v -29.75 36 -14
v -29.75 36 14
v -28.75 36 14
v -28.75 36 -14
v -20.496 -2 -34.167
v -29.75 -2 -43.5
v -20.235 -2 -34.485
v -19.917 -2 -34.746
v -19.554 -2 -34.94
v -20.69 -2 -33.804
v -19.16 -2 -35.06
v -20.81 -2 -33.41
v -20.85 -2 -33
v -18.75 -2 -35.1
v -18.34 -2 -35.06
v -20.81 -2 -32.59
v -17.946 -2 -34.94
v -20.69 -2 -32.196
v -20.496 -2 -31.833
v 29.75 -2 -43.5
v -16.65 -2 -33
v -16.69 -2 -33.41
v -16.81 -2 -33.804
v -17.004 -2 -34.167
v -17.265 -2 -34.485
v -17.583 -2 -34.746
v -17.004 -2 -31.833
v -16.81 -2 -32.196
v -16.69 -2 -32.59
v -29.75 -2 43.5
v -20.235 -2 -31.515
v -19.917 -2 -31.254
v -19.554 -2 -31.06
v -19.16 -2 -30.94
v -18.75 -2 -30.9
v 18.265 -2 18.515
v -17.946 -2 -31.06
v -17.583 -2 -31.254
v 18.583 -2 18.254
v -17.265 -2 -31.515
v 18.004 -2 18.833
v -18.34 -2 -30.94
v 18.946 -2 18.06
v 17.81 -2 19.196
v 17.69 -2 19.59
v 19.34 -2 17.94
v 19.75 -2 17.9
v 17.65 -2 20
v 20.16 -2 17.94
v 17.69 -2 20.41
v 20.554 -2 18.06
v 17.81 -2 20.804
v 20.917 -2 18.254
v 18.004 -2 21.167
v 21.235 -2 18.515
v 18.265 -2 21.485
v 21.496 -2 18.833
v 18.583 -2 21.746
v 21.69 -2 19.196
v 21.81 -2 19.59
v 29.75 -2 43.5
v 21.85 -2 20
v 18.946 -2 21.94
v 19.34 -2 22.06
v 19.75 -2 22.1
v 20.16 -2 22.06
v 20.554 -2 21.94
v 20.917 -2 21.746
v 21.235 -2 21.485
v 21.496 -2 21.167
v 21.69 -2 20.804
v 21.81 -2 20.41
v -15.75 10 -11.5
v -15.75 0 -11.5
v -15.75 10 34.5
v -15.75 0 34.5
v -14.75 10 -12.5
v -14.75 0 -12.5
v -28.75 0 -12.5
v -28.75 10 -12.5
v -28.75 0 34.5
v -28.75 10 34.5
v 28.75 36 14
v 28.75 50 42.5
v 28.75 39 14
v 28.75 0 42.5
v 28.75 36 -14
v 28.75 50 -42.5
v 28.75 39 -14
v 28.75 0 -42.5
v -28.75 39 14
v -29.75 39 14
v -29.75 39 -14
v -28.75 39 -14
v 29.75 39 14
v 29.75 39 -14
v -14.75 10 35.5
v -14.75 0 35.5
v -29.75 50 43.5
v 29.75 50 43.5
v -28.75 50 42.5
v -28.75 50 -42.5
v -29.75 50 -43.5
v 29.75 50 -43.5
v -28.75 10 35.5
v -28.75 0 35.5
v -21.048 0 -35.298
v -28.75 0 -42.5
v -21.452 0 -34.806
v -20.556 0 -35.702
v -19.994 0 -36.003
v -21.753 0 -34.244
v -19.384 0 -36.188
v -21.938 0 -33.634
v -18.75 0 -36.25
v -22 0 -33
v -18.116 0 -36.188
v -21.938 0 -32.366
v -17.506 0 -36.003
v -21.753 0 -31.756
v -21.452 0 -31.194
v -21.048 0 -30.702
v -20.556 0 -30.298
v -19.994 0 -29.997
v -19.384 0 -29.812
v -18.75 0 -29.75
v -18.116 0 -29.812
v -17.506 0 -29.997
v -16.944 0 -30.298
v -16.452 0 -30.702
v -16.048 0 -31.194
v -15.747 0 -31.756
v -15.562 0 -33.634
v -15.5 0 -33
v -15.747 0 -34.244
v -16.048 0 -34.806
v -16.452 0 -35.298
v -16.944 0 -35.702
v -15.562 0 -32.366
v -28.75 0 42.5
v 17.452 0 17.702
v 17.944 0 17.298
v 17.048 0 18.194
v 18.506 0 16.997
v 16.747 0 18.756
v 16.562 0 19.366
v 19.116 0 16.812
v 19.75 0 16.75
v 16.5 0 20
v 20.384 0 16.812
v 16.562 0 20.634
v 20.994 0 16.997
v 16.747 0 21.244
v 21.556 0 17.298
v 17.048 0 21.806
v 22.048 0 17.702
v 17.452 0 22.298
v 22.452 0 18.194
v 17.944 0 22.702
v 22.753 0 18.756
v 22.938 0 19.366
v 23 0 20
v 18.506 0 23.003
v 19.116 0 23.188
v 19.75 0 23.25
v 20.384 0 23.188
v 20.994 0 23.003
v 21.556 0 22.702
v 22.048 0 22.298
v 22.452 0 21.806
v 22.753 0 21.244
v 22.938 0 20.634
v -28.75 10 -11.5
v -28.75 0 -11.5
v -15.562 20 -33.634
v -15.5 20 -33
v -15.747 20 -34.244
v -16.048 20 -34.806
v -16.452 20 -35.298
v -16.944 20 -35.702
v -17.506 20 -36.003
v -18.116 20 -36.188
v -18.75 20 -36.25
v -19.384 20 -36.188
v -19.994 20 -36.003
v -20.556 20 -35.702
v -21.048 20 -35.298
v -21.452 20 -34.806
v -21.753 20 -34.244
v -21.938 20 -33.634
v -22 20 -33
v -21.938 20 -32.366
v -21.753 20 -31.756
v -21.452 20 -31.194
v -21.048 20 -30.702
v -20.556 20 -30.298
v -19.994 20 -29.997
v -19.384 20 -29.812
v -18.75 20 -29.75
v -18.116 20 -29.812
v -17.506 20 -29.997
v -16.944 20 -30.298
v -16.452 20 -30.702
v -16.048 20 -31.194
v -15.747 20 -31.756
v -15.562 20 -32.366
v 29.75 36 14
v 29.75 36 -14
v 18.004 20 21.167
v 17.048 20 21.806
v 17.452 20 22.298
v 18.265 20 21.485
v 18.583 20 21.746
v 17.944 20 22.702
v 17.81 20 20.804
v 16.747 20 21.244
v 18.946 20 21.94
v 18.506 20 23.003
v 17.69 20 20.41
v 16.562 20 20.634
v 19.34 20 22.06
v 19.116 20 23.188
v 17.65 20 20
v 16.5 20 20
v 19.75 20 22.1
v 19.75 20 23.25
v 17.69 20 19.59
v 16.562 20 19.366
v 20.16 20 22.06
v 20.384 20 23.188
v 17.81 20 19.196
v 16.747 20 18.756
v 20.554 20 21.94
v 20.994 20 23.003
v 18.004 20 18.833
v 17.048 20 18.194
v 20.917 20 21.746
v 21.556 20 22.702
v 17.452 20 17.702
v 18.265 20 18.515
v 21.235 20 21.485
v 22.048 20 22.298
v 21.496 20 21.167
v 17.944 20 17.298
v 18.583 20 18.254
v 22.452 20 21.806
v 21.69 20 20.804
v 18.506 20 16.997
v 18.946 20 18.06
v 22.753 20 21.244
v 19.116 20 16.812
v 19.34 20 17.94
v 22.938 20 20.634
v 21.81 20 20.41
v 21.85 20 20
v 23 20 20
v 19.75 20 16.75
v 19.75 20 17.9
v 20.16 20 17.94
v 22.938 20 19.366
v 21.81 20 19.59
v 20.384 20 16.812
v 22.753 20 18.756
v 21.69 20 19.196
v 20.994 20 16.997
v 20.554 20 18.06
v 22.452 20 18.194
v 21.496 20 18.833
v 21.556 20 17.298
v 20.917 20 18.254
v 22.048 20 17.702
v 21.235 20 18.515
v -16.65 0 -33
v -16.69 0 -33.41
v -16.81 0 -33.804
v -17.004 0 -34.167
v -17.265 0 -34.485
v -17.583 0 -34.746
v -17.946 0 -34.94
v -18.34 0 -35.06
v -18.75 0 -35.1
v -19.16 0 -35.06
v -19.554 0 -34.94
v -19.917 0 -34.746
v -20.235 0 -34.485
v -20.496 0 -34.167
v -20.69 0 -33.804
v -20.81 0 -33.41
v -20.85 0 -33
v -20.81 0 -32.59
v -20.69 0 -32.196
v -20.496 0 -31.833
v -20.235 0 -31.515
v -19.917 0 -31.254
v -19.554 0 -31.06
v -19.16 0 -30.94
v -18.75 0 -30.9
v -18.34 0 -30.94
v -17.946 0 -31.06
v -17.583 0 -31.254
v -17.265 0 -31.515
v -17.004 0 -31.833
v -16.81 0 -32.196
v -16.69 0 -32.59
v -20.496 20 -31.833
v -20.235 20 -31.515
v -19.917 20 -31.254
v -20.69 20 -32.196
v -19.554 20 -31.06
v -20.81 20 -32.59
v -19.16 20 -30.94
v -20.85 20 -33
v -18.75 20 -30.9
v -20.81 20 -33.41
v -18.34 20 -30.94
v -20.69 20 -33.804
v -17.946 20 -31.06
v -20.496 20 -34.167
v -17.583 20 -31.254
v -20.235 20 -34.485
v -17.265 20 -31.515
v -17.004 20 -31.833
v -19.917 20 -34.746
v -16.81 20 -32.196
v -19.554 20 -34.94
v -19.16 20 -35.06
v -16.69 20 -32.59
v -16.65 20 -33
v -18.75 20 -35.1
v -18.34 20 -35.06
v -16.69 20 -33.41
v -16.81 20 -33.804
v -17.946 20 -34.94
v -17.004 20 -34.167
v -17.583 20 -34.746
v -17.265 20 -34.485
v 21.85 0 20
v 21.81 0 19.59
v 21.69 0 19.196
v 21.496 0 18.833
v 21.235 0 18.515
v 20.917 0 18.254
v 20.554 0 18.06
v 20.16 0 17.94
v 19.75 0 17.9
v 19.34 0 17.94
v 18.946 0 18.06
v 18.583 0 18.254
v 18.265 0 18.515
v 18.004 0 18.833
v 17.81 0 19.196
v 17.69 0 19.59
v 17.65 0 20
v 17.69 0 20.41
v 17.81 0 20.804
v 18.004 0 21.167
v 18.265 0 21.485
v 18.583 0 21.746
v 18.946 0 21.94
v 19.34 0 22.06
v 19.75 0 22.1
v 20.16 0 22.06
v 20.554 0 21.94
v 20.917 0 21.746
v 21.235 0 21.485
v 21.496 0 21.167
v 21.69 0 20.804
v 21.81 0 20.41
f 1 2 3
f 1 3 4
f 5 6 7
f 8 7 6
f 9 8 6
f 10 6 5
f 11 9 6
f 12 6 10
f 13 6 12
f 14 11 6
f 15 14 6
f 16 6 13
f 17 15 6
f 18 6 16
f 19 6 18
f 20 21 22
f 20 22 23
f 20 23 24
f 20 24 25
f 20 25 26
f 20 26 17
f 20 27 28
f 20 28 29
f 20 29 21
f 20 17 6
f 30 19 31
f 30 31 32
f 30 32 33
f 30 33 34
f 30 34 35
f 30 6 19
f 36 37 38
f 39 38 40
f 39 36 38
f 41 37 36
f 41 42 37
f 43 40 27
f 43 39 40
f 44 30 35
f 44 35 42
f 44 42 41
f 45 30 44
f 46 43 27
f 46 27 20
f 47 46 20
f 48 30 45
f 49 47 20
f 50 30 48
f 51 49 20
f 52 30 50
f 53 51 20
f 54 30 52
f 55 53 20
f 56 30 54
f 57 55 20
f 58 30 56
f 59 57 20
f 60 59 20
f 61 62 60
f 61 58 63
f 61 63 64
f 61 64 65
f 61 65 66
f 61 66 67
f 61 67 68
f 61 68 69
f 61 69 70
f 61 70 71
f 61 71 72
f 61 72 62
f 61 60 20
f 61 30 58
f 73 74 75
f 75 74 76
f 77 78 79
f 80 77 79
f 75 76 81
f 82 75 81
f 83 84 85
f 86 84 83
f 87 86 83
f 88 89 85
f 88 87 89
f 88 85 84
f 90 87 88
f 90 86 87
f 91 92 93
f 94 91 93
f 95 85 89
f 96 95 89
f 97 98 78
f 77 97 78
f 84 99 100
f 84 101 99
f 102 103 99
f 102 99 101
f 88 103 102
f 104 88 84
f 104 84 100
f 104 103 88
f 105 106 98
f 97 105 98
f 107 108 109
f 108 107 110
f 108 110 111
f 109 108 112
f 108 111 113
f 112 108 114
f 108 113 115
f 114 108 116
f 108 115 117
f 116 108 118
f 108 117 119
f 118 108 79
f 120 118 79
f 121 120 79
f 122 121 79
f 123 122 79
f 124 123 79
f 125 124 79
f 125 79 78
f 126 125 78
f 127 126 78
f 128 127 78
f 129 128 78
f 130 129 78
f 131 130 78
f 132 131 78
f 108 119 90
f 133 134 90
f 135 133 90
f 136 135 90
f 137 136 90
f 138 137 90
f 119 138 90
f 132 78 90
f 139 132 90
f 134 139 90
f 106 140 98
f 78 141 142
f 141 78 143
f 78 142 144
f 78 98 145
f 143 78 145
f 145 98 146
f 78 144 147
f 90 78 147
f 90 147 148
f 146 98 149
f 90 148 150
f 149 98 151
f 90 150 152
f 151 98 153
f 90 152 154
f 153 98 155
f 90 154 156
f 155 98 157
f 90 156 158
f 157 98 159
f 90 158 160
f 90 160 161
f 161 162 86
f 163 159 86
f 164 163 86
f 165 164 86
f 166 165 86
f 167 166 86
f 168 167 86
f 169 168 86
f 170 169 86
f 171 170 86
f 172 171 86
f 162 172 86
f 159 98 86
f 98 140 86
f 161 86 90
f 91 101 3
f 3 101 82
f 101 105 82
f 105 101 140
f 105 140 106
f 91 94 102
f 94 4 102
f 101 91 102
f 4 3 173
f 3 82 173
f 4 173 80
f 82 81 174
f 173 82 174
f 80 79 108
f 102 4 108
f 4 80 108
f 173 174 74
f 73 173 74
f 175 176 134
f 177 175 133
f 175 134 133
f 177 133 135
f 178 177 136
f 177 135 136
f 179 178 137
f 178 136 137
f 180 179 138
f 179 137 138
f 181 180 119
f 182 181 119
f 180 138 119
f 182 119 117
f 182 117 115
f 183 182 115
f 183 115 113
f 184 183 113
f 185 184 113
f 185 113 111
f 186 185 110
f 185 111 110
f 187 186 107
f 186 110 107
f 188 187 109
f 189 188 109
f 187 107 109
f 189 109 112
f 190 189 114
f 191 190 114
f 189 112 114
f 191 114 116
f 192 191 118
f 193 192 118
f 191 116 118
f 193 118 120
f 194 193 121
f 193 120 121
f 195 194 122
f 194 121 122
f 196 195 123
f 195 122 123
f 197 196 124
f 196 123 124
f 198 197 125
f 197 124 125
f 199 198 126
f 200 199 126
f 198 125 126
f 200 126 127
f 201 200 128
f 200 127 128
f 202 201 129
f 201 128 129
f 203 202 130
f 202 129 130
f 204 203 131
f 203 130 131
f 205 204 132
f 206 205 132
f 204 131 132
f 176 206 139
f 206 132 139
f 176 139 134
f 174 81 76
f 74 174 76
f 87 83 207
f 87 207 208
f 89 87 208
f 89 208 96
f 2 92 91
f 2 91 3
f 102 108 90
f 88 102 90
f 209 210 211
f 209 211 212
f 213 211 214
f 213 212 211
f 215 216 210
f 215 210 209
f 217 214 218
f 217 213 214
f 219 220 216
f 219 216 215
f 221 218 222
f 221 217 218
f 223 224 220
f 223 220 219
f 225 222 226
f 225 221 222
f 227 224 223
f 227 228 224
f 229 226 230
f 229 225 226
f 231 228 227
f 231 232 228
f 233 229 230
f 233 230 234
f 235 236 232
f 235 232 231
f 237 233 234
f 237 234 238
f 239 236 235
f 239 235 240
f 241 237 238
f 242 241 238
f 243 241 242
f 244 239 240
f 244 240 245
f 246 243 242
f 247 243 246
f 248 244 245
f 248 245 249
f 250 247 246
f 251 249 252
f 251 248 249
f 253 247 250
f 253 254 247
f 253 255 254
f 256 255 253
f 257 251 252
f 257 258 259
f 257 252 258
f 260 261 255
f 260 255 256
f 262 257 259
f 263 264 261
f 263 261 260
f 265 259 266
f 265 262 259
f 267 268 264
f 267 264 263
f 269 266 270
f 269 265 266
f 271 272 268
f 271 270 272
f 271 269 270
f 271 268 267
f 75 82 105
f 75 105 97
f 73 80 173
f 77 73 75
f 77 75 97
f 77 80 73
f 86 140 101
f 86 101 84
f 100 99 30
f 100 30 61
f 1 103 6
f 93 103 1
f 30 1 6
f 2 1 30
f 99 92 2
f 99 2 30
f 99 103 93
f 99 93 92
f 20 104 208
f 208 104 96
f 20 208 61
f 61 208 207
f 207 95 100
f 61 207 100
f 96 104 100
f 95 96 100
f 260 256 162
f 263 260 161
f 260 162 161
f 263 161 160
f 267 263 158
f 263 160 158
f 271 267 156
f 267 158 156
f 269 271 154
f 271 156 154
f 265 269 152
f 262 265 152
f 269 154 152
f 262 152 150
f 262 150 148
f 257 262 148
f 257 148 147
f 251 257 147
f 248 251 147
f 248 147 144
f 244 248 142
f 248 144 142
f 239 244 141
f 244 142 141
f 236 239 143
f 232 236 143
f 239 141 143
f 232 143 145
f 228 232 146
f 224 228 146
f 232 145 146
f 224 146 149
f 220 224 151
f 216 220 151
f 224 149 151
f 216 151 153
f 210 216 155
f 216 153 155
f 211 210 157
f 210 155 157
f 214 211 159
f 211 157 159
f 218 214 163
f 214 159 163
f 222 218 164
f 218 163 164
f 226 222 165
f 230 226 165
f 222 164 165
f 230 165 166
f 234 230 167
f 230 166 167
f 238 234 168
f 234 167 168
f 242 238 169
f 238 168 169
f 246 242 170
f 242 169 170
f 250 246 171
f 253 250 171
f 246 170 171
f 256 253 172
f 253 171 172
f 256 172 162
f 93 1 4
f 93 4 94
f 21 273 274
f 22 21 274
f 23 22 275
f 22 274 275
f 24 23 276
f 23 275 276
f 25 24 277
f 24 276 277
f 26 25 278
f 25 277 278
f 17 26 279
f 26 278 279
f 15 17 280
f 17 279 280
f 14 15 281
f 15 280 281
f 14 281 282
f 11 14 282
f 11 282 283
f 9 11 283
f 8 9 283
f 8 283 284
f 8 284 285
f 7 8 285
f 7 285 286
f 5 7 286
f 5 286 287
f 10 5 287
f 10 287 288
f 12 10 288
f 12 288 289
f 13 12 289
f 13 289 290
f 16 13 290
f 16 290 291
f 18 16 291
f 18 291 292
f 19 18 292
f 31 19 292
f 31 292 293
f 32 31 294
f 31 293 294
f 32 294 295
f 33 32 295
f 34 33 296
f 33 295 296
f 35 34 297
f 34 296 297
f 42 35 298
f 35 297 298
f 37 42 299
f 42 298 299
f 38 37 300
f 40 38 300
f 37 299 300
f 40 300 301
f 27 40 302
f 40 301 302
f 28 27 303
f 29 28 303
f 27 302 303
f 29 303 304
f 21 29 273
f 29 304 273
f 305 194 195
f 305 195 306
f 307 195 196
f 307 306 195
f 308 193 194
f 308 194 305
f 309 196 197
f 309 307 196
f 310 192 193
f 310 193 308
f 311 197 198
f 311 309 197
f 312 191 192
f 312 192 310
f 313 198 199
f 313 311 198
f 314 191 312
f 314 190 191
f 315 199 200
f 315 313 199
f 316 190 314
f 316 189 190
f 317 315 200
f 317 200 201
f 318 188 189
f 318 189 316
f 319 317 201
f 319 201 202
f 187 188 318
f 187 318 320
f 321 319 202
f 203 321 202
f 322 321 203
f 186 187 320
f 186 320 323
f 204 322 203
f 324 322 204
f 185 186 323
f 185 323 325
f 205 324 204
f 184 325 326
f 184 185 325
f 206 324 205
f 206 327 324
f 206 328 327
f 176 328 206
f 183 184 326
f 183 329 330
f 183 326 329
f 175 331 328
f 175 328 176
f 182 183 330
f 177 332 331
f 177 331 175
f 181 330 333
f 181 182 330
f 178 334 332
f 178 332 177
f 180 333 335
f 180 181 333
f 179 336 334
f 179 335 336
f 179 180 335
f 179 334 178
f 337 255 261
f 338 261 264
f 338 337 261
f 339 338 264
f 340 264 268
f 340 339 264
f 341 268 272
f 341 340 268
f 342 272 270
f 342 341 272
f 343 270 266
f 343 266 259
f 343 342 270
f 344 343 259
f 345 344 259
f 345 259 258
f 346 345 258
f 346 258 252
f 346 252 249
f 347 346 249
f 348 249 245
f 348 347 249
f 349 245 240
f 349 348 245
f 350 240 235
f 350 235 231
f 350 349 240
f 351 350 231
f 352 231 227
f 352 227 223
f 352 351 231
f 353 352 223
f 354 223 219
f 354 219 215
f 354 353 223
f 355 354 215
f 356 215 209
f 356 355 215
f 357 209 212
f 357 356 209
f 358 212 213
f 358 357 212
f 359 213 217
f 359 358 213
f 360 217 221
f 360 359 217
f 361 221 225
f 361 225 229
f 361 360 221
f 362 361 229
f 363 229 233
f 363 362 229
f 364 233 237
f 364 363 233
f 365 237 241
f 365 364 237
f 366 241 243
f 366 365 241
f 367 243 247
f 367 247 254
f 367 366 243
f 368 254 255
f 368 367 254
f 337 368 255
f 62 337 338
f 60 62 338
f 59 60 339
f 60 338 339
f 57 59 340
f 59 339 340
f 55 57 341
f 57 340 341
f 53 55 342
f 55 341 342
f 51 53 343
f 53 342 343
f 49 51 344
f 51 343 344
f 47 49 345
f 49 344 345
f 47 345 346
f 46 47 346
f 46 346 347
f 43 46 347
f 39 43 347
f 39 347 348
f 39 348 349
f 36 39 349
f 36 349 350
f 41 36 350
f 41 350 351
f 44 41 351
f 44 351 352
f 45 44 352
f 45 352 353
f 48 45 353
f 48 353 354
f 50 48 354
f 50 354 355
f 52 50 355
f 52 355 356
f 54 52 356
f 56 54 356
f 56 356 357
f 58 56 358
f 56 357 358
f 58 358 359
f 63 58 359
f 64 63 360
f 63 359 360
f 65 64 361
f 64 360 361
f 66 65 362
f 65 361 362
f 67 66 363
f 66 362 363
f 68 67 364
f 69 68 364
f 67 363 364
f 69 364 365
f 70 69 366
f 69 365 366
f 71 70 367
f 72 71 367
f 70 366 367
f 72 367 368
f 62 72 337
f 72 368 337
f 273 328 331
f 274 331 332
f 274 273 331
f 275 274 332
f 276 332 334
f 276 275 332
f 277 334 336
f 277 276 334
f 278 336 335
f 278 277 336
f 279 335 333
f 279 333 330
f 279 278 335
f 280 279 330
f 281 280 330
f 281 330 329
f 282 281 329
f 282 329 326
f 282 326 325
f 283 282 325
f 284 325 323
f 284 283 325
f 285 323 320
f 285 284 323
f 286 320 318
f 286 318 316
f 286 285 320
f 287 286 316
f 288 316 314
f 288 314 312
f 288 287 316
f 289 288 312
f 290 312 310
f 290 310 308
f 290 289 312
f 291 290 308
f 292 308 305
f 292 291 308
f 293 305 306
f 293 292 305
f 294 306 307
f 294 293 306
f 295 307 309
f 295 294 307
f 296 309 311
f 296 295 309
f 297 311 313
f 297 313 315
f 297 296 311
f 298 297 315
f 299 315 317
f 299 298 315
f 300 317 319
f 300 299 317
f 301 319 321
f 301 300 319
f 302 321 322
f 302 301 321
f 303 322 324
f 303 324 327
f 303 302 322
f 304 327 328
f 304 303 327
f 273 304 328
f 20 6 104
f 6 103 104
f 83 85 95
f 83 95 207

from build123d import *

# Parameters (mm, degrees)
CROQUIS1_W                = 59.5
CROQUIS1_H                = 87
SALIENTE_EXTRUIR1_DEPTH   = 50
SALIENTE_EXTRUIR2_DEPTH   = 10
CROQUIS1_5_R              = 3.25
CROQUIS1_5_R_2            = 2.1
SALIENTE_EXTRUIR3_DEPTH   = 20
SALIENTE_EXTRUIR3_2_DEPTH = 20
CROQUIS2_W                = 59.5
CROQUIS2_H                = 87
SALIENTE_EXTRUIR6_DEPTH   = 2
CORTAR_EXTRUIR3_START     = -10
CROQUIS9_R                = 2.1
CORTAR_EXTRUIR3_DEPTH     = 10
CORTAR_EXTRUIR4_DEPTH     = 100


with BuildPart() as part:
    # Croquis1 → Saliente-Extruir1 (new body)
    with BuildSketch(Plane(origin=(0, 0, 0), x_dir=(1, 0, 0), z_dir=(0, 1, 0))):
        Rectangle(CROQUIS1_W, CROQUIS1_H)
        Polygon((28.75, -42.5), (-28.75, -42.5), (-28.75, -35.5), (-28.75, -34.5), (-28.75, 11.5), (-28.75, 12.5), (-28.75, 42.5), (28.75, 42.5), align=None, mode=Mode.SUBTRACT)
    extrude(amount=SALIENTE_EXTRUIR1_DEPTH)

    # Croquis1<4> → Saliente-Extruir2 (add)
    with BuildSketch(Plane(origin=(0, 0, 0), x_dir=(1, 0, 0), z_dir=(0, 1, 0))):
        Polygon((-28.75, -34.5), (-28.75, -35.5), (-14.75, -35.5), (-14.75, 12.5), (-28.75, 12.5), (-28.75, 11.5), (-15.75, 11.5), (-15.75, -34.5), align=None)
    extrude(amount=SALIENTE_EXTRUIR2_DEPTH)



with BuildPart() as body_2:
    # Croquis1<5> → Saliente-Extruir3 (new body)
    with BuildSketch(Plane(origin=(0, 0, 0), x_dir=(1, 0, 0), z_dir=(0, 1, 0))):
        with Locations((19.75, -20)):
            Circle(CROQUIS1_5_R)
        with Locations((19.75, -20)):
            Circle(CROQUIS1_5_R_2, mode=Mode.SUBTRACT)
    extrude(amount=SALIENTE_EXTRUIR3_DEPTH)


with BuildPart() as body_3:
    # Croquis1<5> → Saliente-Extruir3 2 (new body)
    with BuildSketch(Plane(origin=(0, 0, 0), x_dir=(1, 0, 0), z_dir=(0, 1, 0))):
        with Locations((-18.75, 33)):
            Circle(CROQUIS1_5_R)
        with Locations((-18.75, 33)):
            Circle(CROQUIS1_5_R_2, mode=Mode.SUBTRACT)
    extrude(amount=SALIENTE_EXTRUIR3_2_DEPTH)


with BuildPart() as part_1:
    add(part.part)

    add(body_2.part)  # Saliente-Extruir6 merges body 2

    add(body_3.part)  # Saliente-Extruir6 merges body 3
    # Croquis2 → Saliente-Extruir6 (add)
    with BuildSketch(Plane.XZ):
        Rectangle(CROQUIS2_W, CROQUIS2_H)
    extrude(amount=SALIENTE_EXTRUIR6_DEPTH)

    # Croquis9 → Cortar-Extruir3 (cut)
    with BuildSketch(Plane(origin=(0, 0, 0), x_dir=(1, 0, 0), z_dir=(0, 1, 0)).offset(CORTAR_EXTRUIR3_START)):
        with Locations((-18.75, 33)):
            Circle(CROQUIS9_R)
        with Locations((19.75, -20)):
            Circle(CROQUIS9_R)
    extrude(amount=CORTAR_EXTRUIR3_DEPTH, mode=Mode.SUBTRACT)

    # Croquis10 → Cortar-Extruir4 (cut)
    with BuildSketch(Plane.ZY.offset(29.75)):
        Polygon((0, 39), (14, 39), (14, 36), (-14, 36), (-14, 39), align=None)
    extrude(amount=-CORTAR_EXTRUIR4_DEPTH, mode=Mode.SUBTRACT)


solid = part_1.part
